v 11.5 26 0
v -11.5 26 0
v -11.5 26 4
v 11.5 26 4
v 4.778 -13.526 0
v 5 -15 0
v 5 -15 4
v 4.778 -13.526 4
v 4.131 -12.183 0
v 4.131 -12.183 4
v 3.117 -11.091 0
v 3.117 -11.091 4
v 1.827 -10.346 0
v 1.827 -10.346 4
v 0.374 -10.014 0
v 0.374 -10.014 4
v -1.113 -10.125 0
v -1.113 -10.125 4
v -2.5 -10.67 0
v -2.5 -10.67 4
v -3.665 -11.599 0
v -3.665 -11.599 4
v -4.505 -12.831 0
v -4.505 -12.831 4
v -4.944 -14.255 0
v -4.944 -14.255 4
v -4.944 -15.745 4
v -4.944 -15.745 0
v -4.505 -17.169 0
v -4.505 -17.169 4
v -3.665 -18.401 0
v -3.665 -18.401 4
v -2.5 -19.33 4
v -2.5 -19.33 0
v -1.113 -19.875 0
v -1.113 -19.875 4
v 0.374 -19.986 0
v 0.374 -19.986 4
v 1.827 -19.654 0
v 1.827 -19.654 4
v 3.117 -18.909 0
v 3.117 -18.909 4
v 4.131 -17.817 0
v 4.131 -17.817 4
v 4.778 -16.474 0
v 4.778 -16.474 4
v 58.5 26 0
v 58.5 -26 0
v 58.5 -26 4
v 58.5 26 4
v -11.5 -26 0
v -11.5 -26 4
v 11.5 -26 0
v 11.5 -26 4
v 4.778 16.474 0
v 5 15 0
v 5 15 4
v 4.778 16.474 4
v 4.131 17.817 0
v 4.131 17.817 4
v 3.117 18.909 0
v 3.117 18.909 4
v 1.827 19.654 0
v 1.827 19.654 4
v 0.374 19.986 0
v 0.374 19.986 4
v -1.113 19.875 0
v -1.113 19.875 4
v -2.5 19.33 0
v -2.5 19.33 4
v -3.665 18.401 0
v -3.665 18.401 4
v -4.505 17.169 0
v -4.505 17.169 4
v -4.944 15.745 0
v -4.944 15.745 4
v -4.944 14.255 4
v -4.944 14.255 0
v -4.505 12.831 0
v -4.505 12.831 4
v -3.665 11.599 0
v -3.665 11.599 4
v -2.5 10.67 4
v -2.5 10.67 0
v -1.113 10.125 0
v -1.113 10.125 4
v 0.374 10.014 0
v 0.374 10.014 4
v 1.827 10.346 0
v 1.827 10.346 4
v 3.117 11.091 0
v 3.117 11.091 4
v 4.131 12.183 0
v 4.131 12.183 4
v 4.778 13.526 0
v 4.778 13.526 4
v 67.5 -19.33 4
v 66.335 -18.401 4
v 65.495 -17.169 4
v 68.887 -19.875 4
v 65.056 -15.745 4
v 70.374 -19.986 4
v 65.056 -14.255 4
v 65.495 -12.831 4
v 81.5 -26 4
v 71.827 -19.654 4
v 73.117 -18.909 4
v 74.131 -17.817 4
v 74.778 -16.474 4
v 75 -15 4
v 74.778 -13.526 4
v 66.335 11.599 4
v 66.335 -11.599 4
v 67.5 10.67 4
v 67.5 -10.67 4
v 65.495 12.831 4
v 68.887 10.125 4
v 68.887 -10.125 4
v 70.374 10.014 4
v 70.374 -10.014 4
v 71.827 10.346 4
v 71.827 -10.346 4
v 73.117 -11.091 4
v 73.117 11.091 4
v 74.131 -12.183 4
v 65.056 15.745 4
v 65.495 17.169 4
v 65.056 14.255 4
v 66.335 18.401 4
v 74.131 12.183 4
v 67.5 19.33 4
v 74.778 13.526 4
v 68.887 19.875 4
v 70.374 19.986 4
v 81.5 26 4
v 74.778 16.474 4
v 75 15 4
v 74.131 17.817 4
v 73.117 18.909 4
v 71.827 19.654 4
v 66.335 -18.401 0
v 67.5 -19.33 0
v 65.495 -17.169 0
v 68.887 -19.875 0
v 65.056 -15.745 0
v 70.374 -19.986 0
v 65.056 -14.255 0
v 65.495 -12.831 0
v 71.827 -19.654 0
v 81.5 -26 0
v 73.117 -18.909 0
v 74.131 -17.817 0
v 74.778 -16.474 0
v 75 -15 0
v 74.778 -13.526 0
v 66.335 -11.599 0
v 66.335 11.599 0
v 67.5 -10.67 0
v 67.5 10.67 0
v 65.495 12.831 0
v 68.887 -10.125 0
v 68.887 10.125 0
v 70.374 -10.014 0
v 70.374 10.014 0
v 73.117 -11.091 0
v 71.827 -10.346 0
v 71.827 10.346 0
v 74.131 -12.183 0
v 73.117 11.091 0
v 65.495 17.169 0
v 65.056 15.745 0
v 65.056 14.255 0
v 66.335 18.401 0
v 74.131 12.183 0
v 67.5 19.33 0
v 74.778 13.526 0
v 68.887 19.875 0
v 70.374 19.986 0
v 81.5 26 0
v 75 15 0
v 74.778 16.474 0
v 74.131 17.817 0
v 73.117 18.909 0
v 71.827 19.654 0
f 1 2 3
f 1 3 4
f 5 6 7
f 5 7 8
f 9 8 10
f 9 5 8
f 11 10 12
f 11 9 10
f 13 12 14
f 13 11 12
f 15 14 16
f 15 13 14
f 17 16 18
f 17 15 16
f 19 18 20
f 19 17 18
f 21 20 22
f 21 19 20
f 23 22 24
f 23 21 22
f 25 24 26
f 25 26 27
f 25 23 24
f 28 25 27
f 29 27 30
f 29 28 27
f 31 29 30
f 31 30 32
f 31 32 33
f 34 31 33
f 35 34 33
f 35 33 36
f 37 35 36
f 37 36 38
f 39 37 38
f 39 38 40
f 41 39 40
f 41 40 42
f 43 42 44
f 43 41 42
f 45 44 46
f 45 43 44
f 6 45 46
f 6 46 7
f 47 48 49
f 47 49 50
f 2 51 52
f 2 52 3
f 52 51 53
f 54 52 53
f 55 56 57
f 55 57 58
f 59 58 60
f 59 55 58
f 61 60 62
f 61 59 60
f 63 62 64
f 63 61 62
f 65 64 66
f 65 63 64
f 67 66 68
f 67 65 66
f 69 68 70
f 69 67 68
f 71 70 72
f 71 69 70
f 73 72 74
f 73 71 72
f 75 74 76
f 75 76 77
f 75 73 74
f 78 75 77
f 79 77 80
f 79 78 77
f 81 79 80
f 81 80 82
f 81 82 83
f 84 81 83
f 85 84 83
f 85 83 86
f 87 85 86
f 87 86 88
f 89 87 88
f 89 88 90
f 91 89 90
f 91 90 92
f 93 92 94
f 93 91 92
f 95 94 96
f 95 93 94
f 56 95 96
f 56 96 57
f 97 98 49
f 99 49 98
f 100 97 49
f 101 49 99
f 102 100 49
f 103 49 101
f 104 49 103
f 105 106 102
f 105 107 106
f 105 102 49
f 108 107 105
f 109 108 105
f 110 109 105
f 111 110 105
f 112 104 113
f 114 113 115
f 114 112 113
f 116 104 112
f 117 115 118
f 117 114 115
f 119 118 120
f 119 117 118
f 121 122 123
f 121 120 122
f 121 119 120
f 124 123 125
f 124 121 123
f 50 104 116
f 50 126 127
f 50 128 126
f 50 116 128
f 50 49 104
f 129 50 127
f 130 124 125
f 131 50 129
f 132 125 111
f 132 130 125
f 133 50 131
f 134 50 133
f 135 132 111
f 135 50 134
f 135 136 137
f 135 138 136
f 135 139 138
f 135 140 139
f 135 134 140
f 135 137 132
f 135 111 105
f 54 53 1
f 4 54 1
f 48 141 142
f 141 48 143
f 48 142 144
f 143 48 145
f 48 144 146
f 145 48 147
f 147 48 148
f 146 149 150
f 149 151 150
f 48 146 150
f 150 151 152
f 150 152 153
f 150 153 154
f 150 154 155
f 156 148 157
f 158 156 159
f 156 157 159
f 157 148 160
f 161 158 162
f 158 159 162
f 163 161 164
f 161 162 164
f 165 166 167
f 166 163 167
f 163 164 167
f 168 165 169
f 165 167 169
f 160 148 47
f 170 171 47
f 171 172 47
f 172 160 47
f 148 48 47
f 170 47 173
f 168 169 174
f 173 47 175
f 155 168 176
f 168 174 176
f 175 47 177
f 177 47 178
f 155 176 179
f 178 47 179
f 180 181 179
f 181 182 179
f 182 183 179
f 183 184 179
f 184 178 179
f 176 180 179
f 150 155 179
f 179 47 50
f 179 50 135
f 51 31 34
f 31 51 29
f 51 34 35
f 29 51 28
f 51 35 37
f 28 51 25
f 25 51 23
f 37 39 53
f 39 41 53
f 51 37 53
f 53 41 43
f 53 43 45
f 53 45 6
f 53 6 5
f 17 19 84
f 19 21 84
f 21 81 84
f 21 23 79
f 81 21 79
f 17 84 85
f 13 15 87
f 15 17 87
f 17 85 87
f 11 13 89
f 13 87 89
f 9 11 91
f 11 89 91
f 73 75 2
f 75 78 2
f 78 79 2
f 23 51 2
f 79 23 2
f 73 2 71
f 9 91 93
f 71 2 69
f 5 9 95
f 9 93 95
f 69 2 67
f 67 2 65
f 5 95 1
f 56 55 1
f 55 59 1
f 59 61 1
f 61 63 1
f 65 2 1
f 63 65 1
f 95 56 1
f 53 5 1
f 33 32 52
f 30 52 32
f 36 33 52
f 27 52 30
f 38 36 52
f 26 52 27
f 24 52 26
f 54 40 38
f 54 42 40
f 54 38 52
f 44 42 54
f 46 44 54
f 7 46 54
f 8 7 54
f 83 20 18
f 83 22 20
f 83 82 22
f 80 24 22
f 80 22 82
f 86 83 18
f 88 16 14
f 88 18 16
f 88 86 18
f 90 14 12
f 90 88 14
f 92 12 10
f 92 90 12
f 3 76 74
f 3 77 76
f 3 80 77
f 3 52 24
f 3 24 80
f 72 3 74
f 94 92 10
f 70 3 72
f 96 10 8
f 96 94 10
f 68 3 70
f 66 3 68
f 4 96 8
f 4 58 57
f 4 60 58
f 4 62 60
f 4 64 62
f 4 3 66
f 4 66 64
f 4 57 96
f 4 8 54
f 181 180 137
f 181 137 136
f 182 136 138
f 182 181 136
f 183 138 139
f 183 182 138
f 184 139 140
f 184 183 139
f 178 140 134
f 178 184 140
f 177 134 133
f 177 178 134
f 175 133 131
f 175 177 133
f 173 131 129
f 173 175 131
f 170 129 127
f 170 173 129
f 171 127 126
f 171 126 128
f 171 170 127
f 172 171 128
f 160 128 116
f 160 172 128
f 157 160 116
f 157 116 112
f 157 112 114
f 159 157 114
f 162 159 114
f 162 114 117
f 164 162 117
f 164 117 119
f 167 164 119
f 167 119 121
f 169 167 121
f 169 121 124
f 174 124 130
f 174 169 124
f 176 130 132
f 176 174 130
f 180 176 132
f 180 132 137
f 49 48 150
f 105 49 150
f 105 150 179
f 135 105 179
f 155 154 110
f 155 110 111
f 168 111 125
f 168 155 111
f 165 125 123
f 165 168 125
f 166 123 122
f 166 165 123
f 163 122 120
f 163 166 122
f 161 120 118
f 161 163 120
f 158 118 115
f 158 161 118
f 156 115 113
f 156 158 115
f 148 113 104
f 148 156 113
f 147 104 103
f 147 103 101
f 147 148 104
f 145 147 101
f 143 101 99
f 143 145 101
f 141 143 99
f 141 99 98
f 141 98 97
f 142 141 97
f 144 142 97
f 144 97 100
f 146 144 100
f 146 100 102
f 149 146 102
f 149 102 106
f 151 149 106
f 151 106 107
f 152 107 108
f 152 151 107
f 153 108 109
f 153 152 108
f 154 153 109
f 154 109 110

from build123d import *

# Parameters (mm, degrees)
F0_W     = 23
F0_H     = 52
F0_R     = 5
F1_DEPTH = 4


with BuildPart() as f1:
    # F0 (on Top) → F1 (new body)
    with BuildSketch(Plane.XY):
        with Locations((70, 0)):
            Rectangle(F0_W, F0_H)
        with Locations((70, -15)):
            Circle(F0_R, mode=Mode.SUBTRACT)
        with Locations((70, 15)):
            Circle(F0_R, mode=Mode.SUBTRACT)
        Rectangle(F0_W, F0_H)
        with Locations((0, -15)):
            Circle(F0_R, mode=Mode.SUBTRACT)
        with Locations((0, 15)):
            Circle(F0_R, mode=Mode.SUBTRACT)
    extrude(amount=F1_DEPTH)


solid = f1.part
